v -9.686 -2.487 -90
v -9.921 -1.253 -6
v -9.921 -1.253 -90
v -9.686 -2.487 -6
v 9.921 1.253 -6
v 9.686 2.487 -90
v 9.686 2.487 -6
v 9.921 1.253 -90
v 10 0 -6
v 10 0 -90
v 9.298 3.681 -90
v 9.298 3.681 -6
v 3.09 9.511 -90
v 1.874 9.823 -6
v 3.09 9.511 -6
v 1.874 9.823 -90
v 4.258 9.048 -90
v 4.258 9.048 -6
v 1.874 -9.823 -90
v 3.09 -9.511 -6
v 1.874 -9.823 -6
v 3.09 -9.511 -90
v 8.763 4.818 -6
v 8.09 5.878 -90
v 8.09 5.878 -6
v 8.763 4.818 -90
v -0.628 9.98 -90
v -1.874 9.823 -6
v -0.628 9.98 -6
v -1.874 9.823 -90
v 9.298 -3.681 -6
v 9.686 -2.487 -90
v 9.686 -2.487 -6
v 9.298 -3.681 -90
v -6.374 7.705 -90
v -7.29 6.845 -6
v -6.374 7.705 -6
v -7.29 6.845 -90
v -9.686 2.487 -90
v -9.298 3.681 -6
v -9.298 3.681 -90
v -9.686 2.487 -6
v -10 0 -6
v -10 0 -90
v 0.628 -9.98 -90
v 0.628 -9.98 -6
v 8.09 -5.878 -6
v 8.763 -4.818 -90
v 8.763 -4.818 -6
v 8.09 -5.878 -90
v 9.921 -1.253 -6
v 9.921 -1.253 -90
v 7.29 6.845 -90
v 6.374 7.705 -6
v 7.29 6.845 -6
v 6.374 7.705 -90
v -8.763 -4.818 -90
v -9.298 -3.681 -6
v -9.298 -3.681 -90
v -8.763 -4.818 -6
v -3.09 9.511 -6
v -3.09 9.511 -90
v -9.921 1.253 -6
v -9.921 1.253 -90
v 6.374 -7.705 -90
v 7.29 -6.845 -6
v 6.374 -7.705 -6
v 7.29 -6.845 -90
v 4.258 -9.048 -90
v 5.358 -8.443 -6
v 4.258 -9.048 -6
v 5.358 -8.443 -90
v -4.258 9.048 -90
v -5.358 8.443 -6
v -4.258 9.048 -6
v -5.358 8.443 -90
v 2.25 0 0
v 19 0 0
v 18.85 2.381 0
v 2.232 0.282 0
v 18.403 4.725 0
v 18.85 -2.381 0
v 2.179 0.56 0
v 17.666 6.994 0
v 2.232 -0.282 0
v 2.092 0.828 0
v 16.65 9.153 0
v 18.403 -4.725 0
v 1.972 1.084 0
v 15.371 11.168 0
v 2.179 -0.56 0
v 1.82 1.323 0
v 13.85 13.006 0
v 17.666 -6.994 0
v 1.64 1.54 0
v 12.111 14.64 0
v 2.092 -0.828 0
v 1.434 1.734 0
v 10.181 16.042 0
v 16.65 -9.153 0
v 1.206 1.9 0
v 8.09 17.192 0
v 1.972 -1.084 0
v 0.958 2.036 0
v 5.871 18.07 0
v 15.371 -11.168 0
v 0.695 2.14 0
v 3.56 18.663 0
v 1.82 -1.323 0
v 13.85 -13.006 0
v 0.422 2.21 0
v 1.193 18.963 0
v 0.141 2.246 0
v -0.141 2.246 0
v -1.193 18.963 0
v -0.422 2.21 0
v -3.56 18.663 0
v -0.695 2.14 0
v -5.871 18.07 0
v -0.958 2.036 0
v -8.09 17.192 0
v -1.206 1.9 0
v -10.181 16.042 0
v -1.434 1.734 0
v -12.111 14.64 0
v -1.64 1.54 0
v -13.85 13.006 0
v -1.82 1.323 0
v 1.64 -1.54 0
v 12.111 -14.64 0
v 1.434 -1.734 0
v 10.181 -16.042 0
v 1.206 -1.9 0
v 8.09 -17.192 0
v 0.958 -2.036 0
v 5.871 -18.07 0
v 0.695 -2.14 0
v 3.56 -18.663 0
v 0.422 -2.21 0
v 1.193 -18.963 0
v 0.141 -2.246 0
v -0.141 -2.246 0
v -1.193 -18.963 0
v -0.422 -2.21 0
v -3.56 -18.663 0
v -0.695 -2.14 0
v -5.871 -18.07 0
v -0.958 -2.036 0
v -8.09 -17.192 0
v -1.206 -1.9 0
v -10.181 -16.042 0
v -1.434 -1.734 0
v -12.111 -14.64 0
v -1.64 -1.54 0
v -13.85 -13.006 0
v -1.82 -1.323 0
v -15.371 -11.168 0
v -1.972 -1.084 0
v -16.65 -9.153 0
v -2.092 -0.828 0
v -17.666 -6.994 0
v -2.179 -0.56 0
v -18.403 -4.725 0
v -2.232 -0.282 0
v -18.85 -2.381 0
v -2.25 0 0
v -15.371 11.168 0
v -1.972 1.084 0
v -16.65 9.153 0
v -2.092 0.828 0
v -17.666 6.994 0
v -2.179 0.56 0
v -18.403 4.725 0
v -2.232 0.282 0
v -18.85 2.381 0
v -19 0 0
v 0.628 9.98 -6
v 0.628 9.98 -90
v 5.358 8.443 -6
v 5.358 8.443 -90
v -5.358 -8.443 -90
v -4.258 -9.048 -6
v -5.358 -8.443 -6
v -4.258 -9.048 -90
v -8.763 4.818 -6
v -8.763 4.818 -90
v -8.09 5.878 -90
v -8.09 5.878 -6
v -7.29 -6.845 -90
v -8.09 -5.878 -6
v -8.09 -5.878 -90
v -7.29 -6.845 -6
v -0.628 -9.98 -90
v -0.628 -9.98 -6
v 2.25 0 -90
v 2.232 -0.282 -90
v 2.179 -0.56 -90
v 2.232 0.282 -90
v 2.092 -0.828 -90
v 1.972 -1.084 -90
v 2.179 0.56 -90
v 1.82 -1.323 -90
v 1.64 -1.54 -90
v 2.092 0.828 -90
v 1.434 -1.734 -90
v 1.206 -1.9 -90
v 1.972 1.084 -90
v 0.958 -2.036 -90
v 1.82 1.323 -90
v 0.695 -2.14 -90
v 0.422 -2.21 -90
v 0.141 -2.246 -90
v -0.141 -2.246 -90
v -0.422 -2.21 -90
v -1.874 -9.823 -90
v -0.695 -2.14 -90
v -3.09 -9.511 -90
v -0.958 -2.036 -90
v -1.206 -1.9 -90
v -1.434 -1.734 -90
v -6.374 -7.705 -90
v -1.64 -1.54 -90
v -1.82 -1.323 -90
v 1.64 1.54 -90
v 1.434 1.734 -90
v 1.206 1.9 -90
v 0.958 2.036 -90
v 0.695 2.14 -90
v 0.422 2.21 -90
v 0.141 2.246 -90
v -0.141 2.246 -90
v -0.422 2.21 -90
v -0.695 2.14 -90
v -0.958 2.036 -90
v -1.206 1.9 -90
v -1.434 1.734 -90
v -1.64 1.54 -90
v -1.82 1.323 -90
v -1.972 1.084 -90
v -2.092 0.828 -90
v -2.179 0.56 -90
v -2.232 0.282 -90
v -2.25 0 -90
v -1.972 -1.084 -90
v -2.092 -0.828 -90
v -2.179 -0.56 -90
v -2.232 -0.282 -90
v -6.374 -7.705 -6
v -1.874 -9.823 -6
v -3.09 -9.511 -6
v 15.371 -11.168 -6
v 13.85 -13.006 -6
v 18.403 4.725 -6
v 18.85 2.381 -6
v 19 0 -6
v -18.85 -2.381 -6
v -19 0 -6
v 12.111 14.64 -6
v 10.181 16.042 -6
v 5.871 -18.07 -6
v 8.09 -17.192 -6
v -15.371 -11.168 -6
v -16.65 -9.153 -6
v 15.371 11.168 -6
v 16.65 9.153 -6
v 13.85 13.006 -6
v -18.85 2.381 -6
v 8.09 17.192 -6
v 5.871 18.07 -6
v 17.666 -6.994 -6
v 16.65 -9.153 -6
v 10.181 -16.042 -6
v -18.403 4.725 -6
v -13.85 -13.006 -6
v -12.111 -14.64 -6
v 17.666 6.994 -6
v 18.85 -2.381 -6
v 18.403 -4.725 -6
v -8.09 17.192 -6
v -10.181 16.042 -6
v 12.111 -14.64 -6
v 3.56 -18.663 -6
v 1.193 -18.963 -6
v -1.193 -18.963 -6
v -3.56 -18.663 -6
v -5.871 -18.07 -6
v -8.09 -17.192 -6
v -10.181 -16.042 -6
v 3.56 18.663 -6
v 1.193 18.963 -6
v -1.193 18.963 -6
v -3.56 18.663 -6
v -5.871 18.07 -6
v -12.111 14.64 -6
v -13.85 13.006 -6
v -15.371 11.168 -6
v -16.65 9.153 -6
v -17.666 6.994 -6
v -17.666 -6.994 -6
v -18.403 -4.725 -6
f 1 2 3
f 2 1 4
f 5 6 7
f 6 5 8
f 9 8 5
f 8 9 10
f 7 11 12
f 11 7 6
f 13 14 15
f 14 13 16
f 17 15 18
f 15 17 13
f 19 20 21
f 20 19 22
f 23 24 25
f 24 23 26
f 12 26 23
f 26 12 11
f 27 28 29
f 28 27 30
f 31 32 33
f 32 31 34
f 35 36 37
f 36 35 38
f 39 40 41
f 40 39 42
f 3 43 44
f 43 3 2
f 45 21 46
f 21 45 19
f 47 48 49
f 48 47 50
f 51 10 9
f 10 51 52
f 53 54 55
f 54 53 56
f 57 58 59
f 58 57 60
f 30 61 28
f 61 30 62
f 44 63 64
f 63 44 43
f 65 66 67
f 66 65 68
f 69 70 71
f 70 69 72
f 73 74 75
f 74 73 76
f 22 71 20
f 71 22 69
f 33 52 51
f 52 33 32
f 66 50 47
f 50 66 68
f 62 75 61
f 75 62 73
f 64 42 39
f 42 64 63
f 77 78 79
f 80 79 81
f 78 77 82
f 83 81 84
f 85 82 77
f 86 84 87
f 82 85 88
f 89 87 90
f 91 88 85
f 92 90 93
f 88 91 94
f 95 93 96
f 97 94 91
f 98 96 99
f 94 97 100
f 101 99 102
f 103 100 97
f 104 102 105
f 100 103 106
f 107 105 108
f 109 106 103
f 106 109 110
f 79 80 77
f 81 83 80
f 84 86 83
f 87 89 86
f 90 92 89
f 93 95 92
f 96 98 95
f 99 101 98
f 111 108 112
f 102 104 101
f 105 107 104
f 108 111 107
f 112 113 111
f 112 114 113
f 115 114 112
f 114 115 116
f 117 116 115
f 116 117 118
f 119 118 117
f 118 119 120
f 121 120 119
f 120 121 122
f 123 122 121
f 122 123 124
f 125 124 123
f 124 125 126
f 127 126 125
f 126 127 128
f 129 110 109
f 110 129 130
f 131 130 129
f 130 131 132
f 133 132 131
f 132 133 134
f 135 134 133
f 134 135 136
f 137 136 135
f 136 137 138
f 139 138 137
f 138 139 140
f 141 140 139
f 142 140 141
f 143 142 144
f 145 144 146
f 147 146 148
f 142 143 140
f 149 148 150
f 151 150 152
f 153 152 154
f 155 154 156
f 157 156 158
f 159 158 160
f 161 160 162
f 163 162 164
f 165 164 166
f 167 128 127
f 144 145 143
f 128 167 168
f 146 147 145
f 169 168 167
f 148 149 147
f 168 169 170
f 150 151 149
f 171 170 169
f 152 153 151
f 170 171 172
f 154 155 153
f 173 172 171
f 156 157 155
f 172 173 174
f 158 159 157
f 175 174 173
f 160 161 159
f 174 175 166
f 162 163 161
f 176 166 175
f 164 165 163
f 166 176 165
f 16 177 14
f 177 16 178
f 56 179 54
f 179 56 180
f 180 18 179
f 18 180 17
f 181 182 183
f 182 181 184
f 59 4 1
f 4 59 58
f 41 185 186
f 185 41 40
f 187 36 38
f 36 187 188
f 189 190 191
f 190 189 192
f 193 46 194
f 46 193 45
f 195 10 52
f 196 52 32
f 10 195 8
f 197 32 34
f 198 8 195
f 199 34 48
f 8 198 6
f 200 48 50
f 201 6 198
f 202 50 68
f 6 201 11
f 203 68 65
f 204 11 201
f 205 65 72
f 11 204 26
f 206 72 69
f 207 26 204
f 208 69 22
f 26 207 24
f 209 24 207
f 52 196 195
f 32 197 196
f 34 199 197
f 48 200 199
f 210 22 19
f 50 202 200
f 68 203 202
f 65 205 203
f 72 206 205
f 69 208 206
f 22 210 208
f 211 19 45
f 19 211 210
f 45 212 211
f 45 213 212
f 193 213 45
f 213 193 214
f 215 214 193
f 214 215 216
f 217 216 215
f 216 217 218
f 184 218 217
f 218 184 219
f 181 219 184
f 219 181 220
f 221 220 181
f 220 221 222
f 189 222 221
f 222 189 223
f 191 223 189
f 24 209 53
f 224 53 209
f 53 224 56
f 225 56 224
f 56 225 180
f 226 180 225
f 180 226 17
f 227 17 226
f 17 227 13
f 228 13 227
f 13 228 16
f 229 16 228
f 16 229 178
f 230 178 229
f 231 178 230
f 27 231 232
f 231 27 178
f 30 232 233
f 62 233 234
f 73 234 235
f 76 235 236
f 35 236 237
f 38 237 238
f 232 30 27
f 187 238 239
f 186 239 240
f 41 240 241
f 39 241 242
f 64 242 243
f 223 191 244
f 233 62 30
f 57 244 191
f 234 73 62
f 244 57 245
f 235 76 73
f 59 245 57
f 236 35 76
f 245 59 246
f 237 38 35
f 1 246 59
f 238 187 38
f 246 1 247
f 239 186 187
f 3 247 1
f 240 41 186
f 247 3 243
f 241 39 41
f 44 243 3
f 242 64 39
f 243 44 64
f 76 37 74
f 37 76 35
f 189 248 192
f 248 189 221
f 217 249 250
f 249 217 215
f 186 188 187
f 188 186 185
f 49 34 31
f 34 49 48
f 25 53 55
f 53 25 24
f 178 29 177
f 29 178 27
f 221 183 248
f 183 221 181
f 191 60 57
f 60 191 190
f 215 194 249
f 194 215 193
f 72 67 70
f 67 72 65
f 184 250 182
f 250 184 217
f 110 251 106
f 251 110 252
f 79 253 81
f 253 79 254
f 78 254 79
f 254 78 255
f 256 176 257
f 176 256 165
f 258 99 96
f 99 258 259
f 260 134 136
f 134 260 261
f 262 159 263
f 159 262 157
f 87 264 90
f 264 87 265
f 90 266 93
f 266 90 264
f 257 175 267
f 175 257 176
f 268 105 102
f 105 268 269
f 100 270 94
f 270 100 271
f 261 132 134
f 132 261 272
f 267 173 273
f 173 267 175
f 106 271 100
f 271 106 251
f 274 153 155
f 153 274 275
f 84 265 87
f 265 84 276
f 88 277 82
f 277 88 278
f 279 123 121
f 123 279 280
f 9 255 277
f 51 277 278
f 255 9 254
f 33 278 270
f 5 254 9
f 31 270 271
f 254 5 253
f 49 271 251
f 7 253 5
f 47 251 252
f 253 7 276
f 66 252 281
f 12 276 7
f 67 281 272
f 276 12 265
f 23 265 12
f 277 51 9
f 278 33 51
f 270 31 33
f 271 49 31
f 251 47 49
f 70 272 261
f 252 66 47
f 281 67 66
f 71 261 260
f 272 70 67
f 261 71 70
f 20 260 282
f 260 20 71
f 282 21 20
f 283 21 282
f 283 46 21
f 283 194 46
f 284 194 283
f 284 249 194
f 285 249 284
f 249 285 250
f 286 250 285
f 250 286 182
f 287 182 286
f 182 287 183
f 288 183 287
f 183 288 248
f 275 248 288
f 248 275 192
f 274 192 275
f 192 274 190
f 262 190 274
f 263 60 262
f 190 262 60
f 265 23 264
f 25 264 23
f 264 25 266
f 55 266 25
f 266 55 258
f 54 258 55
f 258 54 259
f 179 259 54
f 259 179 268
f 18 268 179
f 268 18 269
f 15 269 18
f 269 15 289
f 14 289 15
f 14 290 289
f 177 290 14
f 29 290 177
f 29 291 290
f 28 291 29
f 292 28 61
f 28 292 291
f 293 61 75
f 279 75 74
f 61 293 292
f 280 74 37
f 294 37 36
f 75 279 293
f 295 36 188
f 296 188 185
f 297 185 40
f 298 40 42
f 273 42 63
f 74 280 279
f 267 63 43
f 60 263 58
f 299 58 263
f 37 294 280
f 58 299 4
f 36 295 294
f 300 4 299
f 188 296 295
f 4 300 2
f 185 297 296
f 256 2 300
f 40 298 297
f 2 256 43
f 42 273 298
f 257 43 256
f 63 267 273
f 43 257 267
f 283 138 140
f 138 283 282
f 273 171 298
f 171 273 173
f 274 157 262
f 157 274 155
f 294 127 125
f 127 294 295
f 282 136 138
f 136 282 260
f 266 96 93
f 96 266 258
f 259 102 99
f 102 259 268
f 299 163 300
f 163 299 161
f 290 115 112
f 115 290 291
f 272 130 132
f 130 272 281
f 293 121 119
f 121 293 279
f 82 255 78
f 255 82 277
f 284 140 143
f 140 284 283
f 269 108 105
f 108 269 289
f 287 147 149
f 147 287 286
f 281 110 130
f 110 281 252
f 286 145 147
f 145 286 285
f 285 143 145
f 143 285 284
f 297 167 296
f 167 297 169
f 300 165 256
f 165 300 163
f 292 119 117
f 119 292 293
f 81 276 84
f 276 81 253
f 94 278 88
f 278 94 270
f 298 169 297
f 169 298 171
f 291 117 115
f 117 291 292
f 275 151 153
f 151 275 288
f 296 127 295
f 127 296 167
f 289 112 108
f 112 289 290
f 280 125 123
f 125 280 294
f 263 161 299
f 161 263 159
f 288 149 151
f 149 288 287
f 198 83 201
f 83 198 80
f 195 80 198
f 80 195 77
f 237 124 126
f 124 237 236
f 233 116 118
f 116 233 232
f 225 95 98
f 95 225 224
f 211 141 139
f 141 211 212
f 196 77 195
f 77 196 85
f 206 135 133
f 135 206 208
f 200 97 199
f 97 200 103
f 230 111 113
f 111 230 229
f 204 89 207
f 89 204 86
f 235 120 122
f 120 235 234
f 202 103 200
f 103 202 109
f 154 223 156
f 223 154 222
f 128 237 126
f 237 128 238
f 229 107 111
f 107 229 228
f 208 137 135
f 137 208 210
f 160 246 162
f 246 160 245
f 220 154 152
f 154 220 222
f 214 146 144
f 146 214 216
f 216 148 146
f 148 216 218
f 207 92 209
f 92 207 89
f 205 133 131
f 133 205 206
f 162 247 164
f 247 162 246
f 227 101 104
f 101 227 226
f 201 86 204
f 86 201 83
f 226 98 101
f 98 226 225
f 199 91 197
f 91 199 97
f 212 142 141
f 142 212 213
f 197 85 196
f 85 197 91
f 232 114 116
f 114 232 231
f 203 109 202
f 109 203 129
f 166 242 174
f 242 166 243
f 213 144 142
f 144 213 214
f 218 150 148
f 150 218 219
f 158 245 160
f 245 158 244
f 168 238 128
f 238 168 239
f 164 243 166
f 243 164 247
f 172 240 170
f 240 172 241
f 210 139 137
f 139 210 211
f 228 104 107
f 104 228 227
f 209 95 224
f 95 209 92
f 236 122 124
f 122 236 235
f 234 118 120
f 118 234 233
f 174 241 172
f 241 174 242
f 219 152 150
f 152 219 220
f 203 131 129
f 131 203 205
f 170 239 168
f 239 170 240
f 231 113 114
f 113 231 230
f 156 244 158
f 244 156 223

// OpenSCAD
$fn = 50;


difference() {
	union() {
		translate(v = [0, 0, -90.0000000000]) {
			cylinder(h = 90, r = 10.0000000000);
		}
		translate(v = [0, 0, -6.0000000000]) {
			cylinder(h = 6, r = 19.0000000000);
		}
	}
	union() {
		#translate(v = [0, 0, -90]) {
			cylinder(h = 90, r = 2.2500000000);
		}
	}
}
